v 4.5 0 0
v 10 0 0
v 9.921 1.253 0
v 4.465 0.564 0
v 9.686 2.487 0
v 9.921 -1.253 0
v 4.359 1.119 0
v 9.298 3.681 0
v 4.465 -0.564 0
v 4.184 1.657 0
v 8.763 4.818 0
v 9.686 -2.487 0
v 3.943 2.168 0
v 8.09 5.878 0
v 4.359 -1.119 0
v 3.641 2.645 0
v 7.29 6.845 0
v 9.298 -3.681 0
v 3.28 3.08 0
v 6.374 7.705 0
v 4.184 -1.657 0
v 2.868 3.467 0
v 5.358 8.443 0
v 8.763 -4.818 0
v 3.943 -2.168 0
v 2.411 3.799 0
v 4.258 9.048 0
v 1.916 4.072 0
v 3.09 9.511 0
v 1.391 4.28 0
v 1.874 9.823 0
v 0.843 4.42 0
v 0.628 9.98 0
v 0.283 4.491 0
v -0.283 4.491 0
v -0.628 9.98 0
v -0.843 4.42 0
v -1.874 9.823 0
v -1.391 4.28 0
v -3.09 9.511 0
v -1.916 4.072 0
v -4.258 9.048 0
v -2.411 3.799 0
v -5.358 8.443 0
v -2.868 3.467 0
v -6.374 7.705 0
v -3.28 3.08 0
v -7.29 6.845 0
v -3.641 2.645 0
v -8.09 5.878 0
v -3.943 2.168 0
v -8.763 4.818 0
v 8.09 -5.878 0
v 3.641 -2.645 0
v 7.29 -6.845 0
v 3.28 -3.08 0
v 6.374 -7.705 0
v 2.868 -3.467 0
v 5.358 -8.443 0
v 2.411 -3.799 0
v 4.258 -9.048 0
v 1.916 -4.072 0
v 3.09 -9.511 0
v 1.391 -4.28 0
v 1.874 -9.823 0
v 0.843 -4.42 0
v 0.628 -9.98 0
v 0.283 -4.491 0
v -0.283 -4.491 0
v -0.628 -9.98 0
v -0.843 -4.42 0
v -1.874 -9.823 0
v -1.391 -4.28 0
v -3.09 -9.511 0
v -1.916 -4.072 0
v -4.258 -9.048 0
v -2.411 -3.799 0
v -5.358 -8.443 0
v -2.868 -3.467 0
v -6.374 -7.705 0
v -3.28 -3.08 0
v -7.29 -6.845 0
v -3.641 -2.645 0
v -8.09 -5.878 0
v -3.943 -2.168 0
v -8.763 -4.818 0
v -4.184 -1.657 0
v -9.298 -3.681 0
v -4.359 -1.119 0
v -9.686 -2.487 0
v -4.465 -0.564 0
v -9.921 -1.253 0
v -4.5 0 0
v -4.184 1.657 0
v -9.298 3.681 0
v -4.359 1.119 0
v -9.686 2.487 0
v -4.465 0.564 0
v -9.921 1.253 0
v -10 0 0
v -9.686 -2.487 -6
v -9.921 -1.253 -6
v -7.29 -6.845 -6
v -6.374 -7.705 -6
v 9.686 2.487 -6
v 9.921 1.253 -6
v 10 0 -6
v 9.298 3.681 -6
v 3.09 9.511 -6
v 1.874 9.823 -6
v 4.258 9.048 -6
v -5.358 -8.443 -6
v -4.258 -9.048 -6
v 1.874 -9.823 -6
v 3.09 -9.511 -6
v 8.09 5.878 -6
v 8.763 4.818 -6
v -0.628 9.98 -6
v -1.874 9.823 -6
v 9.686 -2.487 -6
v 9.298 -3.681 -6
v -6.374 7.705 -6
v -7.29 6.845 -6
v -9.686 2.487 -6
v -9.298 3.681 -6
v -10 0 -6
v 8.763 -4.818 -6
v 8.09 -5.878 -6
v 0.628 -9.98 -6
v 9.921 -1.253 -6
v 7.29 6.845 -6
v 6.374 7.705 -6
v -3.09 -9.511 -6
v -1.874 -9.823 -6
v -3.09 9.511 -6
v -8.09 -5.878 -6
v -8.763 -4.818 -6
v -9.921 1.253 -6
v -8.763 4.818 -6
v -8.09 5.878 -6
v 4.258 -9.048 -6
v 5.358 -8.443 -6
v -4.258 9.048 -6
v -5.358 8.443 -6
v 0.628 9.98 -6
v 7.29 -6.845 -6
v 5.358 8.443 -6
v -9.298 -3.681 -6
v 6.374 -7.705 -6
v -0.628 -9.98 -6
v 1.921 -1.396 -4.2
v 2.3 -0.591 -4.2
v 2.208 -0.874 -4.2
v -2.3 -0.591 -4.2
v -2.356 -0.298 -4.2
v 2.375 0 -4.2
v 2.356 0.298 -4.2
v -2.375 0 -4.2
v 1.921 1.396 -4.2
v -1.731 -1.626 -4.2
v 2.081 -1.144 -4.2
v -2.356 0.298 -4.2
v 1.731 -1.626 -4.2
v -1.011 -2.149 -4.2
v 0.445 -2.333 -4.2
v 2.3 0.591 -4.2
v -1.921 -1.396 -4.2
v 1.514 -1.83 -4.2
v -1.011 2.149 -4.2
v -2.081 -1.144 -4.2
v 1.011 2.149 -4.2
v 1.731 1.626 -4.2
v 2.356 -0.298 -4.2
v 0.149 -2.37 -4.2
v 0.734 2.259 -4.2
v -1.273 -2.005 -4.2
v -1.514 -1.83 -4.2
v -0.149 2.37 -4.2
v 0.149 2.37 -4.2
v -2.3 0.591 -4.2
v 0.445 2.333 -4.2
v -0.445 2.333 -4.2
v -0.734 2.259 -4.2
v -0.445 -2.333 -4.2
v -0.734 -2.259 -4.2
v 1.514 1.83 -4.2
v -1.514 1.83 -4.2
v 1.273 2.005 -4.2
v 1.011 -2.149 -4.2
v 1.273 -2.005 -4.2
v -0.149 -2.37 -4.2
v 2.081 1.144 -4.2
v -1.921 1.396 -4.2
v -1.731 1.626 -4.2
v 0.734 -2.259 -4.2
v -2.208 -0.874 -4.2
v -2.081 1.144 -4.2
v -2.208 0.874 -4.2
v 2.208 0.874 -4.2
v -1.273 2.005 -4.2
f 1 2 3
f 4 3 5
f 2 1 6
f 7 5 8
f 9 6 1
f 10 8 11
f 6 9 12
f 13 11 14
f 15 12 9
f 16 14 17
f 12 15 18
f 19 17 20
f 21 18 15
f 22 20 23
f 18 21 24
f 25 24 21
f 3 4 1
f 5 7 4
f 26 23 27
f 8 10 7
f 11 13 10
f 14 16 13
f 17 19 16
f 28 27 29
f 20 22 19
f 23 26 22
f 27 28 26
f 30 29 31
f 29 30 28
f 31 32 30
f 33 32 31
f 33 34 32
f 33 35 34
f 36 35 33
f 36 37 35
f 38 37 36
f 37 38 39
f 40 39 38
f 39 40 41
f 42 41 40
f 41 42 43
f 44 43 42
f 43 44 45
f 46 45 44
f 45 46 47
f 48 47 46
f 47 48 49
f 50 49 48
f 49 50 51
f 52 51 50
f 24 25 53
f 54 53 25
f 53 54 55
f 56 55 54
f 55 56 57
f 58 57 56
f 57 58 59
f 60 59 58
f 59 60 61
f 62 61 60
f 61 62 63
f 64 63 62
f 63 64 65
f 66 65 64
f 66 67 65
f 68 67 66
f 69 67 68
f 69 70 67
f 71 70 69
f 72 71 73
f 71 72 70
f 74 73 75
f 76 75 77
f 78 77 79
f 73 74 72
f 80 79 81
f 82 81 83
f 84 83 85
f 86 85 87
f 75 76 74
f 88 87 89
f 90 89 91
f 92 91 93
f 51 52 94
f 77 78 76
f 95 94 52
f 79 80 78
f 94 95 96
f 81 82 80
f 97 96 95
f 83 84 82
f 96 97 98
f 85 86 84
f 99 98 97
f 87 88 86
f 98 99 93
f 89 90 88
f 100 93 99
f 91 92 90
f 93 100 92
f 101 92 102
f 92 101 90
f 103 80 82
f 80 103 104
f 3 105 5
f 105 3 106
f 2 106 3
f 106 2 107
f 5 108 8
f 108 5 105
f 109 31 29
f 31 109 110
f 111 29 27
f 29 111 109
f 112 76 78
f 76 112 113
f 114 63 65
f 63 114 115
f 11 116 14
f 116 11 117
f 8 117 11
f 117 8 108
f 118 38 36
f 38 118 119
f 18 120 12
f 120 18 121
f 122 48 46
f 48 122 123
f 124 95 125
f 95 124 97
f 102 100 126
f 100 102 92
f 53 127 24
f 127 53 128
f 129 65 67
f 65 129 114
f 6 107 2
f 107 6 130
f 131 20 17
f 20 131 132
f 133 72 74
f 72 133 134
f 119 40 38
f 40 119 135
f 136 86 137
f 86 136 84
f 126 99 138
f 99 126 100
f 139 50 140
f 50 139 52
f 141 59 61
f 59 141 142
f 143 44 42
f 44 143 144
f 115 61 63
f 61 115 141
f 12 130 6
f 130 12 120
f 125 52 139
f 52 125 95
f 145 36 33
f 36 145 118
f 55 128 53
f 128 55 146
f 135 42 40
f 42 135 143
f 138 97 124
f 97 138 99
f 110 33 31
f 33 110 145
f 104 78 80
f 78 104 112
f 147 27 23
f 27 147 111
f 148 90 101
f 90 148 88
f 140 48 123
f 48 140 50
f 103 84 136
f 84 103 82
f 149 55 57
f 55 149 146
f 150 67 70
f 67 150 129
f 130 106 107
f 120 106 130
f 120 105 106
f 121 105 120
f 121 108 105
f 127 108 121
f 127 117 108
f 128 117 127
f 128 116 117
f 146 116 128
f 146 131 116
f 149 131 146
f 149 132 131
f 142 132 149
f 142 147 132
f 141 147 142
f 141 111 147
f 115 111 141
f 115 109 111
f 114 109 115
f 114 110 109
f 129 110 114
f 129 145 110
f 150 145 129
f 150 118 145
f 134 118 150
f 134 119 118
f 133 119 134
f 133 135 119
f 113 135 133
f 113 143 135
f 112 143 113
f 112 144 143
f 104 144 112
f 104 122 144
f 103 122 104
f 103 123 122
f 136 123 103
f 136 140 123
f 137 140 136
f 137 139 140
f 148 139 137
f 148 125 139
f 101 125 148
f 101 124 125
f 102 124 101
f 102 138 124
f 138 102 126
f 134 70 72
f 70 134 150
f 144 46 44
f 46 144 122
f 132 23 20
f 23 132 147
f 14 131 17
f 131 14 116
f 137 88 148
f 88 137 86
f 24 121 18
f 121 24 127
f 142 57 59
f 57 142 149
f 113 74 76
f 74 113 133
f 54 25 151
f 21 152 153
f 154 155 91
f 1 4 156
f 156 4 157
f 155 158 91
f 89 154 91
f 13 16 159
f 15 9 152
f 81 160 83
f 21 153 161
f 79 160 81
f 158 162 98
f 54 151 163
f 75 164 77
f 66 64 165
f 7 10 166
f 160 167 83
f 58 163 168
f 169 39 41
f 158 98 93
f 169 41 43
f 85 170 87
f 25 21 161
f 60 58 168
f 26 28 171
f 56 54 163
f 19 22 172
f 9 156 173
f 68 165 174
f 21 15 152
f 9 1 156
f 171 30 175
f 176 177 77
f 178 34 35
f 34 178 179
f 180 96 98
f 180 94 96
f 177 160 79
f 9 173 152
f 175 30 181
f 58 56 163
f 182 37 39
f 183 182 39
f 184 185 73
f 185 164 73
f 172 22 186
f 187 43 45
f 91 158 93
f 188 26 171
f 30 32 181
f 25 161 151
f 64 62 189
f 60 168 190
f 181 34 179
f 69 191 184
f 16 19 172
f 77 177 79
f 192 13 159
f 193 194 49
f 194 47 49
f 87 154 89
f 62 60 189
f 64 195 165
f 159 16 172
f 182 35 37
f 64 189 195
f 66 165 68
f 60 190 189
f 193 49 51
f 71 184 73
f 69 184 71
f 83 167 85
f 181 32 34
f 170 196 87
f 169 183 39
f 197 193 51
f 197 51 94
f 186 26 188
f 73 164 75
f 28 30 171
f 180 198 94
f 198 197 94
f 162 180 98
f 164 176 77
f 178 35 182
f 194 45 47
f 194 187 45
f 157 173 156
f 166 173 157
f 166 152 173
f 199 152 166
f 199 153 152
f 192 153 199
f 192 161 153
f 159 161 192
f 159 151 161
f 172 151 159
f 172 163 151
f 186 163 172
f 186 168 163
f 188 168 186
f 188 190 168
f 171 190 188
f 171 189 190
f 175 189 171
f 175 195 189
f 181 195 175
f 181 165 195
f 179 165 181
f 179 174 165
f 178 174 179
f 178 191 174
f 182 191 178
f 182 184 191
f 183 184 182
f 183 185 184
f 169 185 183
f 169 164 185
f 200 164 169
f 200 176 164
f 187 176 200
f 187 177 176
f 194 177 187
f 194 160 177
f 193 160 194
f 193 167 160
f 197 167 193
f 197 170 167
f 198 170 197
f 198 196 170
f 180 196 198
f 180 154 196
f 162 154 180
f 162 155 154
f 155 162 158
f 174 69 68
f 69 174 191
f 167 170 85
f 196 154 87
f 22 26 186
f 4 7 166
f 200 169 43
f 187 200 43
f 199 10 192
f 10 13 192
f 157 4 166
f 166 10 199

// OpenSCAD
$fn = 50;


difference() {
	union() {
		translate(v = [0, 0, -3.0000000000]) {
			cylinder(h = 3, r = 7.0000000000);
		}
		translate(v = [0, 0, -6.0000000000]) {
			cylinder(h = 6, r = 10.0000000000);
		}
	}
	union() {
		translate(v = [0, 0, 0]) {
			rotate(a = [0, 0, 0]) {
				difference() {
					union() {
						#translate(v = [0, 0, -3.0000000000]) {
							cylinder(h = 3, r = 2.2500000000);
						}
						#translate(v = [0, 0, -4.2000000000]) {
							cylinder(h = 4.2000000000, r1 = 2.3750000000, r2 = 4.5000000000);
						}
						#translate(v = [0, 0, -3.0000000000]) {
							cylinder(h = 3, r = 2.3750000000);
						}
						#translate(v = [0, 0, -3.0000000000]) {
							cylinder(h = 3, r = 2.2500000000);
						}
					}
					union();
				}
			}
		}
	}
}
